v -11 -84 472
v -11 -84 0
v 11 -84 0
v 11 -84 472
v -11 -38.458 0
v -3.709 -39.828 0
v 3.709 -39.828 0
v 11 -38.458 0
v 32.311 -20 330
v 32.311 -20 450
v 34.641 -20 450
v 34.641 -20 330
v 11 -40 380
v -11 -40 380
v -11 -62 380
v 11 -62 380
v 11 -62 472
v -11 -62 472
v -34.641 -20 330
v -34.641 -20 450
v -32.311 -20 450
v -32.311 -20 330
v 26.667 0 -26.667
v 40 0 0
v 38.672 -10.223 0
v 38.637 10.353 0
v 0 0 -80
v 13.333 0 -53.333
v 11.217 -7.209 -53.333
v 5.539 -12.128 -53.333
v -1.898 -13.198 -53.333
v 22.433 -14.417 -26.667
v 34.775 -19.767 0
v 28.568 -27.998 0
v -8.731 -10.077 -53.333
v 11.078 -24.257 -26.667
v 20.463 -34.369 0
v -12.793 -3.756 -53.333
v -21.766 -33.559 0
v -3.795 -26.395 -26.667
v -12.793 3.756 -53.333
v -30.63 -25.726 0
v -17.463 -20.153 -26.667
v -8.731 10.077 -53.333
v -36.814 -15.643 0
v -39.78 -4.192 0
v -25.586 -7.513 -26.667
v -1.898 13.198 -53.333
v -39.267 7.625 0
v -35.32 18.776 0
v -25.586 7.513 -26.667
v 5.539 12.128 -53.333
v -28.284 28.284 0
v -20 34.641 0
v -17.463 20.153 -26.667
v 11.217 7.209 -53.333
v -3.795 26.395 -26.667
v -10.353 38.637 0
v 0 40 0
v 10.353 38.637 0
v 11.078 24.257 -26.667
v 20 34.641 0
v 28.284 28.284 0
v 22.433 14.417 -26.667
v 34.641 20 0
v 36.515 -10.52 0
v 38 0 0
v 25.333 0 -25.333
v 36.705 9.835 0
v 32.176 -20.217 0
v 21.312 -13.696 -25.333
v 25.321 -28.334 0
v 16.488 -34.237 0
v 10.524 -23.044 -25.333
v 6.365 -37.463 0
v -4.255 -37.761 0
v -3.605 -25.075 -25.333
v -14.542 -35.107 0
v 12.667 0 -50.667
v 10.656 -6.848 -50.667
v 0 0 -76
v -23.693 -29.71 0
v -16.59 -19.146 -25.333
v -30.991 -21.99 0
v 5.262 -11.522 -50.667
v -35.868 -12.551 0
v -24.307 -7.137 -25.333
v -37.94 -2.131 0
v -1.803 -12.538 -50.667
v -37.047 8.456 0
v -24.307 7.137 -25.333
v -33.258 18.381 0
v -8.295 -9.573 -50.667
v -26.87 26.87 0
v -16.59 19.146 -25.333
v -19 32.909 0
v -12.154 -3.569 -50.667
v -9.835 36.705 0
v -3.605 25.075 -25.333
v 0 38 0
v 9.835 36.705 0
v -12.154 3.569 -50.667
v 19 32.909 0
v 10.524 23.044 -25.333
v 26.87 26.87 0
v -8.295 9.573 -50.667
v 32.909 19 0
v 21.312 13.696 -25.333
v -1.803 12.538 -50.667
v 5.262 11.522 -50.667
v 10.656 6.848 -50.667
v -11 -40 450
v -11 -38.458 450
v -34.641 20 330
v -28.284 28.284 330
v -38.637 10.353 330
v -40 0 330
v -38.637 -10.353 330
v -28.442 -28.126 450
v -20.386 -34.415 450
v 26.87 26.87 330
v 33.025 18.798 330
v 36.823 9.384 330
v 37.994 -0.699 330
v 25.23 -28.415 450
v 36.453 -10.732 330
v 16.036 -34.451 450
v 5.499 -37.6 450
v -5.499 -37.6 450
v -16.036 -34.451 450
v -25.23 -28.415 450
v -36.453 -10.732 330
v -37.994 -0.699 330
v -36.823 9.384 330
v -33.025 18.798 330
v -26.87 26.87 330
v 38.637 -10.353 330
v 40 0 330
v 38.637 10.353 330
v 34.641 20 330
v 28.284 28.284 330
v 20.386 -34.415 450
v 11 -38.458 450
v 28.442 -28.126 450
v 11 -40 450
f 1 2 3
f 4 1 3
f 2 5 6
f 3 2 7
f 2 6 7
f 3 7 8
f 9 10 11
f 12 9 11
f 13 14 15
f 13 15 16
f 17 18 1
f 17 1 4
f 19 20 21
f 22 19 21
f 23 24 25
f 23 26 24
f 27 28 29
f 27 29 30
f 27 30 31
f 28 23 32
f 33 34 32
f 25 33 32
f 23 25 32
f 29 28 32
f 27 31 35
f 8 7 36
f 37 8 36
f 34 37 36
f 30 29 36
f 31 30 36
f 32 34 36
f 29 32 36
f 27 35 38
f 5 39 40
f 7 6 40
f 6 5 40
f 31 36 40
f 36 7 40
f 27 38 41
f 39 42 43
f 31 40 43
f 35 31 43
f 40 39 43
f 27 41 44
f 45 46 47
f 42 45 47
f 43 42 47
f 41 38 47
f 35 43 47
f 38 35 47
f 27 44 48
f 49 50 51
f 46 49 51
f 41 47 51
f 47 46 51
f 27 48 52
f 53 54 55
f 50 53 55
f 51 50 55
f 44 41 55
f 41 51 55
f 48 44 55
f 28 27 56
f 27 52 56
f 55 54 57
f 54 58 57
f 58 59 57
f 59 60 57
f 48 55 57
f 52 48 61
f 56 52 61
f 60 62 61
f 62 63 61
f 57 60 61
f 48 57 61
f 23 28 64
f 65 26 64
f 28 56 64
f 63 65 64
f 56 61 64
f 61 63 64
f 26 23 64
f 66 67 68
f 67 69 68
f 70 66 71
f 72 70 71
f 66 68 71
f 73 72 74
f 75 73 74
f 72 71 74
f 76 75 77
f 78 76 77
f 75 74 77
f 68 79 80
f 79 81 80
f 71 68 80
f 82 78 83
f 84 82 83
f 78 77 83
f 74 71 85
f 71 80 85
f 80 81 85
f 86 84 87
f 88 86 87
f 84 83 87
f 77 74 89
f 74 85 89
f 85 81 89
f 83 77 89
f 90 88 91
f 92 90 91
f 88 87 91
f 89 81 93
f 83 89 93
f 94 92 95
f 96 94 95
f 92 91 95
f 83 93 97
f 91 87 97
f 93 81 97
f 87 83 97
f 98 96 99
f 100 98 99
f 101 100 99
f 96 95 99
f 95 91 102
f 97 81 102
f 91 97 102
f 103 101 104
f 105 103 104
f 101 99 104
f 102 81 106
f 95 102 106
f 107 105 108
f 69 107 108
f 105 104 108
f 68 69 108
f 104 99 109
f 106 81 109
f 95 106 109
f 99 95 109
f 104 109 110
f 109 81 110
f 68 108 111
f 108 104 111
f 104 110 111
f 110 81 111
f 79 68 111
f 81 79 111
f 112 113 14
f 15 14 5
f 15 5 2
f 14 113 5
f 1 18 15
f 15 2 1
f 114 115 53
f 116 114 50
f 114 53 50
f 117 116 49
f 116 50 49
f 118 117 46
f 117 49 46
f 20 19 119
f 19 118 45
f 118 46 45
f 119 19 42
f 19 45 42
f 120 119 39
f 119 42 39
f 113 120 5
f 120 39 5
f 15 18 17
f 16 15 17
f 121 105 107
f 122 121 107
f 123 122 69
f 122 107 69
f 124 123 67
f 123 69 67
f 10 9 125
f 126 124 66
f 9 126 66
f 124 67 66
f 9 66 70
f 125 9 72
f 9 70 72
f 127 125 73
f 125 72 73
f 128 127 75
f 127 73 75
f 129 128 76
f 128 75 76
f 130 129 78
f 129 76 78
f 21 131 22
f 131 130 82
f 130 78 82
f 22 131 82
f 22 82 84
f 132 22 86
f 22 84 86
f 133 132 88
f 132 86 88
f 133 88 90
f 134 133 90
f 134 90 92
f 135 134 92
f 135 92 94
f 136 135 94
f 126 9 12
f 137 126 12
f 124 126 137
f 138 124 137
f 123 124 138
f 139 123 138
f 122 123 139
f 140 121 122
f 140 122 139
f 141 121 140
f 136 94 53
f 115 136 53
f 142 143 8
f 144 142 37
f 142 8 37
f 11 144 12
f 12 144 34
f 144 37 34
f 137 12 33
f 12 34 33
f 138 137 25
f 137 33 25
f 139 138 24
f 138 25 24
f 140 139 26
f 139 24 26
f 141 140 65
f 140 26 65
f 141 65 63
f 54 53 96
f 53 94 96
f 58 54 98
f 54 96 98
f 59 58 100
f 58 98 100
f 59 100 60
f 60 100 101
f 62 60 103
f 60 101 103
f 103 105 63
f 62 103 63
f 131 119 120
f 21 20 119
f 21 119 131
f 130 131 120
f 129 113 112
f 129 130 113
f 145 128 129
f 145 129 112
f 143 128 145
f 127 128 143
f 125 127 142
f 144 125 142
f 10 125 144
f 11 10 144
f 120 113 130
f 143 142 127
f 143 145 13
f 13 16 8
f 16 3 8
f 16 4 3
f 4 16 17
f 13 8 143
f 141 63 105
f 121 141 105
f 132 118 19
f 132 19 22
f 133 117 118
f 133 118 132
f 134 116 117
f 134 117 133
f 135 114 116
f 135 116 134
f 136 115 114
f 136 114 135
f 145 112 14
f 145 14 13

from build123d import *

# Parameters (mm, degrees)
BOSS_EXTRU_1_DEPTH      = 472
ESQUISSE2_W             = 165
ESQUISSE2_H             = 124
ENL_V_MAT_EXTRU_1_DEPTH = 22
ESQUISSE3_W             = 50
ESQUISSE3_H             = 22
ENL_V_MAT_EXTRU_2_DEPTH = 70
ENL_V_MAT_EXTRU_3_DEPTH = 120


with BuildPart() as part:
    # Esquisse1 → Boss.-Extru.1 (new body)
    with BuildSketch(Plane.XY):
        with BuildLine():
            Line((-11, -38.457769046), (-11, -84))
            Line((-11, -84), (11, -84))
            Line((11, -84), (11, -38.457769046))
            ThreePointArc((11, -38.457769046), (38.722583559, -10.028036822), (28.284271247, 28.284271247))
            Line((28.284271247, 28.284271247), (26.870057685, 26.870057685))
            ThreePointArc((26.870057685, 26.870057685), (0, -38), (-26.870057685, 26.870057685))
            Line((-26.870057685, 26.870057685), (-28.284271247, 28.284271247))
            ThreePointArc((-28.284271247, 28.284271247), (-38.722583559, -10.028036822), (-11, -38.457769046))
        make_face()
    extrude(amount=BOSS_EXTRU_1_DEPTH)

    # Esquisse2 → Enlèv. mat.-Extru.1 (cut)
    with BuildSketch(Plane.XY.offset(472)):
        Rectangle(ESQUISSE2_W, ESQUISSE2_H)
    extrude(amount=-ENL_V_MAT_EXTRU_1_DEPTH, mode=Mode.SUBTRACT)

    # Esquisse3 → Enlèv. mat.-Extru.2 (cut)
    with BuildSketch(Plane.XY.offset(450)):
        with Locations((0, -51)):
            Rectangle(ESQUISSE3_W, ESQUISSE3_H)
    extrude(amount=-ENL_V_MAT_EXTRU_2_DEPTH, mode=Mode.SUBTRACT)

    # Esquisse4 → Enlèv. mat.-Extru.3 (cut)
    with BuildSketch(Plane.XY.offset(450)):
        Polygon((-67.5, 20), (-67.5, -20), (67.5, -20), (67.5, 20), (67.5, 60), (-67.5, 60), align=None)
    extrude(amount=-ENL_V_MAT_EXTRU_3_DEPTH, mode=Mode.SUBTRACT)

    # Esquisse6 → Révolution1 (revolve)
    with BuildSketch(Plane(origin=(0, 0, 0), x_dir=(1, 0, 0), z_dir=(0, 1, 0)), mode=Mode.PRIVATE) as r_volution1_sk:
        Polygon((0, 80), (-40, 0), (-38, 0), (0, 76), align=None)
    revolve(r_volution1_sk.sketch.rotate(Axis((0, 0, 0), (0, 0, -1)), 180), axis=Axis((0, 0, 0), (0, 0, -1)))


solid = part.part
